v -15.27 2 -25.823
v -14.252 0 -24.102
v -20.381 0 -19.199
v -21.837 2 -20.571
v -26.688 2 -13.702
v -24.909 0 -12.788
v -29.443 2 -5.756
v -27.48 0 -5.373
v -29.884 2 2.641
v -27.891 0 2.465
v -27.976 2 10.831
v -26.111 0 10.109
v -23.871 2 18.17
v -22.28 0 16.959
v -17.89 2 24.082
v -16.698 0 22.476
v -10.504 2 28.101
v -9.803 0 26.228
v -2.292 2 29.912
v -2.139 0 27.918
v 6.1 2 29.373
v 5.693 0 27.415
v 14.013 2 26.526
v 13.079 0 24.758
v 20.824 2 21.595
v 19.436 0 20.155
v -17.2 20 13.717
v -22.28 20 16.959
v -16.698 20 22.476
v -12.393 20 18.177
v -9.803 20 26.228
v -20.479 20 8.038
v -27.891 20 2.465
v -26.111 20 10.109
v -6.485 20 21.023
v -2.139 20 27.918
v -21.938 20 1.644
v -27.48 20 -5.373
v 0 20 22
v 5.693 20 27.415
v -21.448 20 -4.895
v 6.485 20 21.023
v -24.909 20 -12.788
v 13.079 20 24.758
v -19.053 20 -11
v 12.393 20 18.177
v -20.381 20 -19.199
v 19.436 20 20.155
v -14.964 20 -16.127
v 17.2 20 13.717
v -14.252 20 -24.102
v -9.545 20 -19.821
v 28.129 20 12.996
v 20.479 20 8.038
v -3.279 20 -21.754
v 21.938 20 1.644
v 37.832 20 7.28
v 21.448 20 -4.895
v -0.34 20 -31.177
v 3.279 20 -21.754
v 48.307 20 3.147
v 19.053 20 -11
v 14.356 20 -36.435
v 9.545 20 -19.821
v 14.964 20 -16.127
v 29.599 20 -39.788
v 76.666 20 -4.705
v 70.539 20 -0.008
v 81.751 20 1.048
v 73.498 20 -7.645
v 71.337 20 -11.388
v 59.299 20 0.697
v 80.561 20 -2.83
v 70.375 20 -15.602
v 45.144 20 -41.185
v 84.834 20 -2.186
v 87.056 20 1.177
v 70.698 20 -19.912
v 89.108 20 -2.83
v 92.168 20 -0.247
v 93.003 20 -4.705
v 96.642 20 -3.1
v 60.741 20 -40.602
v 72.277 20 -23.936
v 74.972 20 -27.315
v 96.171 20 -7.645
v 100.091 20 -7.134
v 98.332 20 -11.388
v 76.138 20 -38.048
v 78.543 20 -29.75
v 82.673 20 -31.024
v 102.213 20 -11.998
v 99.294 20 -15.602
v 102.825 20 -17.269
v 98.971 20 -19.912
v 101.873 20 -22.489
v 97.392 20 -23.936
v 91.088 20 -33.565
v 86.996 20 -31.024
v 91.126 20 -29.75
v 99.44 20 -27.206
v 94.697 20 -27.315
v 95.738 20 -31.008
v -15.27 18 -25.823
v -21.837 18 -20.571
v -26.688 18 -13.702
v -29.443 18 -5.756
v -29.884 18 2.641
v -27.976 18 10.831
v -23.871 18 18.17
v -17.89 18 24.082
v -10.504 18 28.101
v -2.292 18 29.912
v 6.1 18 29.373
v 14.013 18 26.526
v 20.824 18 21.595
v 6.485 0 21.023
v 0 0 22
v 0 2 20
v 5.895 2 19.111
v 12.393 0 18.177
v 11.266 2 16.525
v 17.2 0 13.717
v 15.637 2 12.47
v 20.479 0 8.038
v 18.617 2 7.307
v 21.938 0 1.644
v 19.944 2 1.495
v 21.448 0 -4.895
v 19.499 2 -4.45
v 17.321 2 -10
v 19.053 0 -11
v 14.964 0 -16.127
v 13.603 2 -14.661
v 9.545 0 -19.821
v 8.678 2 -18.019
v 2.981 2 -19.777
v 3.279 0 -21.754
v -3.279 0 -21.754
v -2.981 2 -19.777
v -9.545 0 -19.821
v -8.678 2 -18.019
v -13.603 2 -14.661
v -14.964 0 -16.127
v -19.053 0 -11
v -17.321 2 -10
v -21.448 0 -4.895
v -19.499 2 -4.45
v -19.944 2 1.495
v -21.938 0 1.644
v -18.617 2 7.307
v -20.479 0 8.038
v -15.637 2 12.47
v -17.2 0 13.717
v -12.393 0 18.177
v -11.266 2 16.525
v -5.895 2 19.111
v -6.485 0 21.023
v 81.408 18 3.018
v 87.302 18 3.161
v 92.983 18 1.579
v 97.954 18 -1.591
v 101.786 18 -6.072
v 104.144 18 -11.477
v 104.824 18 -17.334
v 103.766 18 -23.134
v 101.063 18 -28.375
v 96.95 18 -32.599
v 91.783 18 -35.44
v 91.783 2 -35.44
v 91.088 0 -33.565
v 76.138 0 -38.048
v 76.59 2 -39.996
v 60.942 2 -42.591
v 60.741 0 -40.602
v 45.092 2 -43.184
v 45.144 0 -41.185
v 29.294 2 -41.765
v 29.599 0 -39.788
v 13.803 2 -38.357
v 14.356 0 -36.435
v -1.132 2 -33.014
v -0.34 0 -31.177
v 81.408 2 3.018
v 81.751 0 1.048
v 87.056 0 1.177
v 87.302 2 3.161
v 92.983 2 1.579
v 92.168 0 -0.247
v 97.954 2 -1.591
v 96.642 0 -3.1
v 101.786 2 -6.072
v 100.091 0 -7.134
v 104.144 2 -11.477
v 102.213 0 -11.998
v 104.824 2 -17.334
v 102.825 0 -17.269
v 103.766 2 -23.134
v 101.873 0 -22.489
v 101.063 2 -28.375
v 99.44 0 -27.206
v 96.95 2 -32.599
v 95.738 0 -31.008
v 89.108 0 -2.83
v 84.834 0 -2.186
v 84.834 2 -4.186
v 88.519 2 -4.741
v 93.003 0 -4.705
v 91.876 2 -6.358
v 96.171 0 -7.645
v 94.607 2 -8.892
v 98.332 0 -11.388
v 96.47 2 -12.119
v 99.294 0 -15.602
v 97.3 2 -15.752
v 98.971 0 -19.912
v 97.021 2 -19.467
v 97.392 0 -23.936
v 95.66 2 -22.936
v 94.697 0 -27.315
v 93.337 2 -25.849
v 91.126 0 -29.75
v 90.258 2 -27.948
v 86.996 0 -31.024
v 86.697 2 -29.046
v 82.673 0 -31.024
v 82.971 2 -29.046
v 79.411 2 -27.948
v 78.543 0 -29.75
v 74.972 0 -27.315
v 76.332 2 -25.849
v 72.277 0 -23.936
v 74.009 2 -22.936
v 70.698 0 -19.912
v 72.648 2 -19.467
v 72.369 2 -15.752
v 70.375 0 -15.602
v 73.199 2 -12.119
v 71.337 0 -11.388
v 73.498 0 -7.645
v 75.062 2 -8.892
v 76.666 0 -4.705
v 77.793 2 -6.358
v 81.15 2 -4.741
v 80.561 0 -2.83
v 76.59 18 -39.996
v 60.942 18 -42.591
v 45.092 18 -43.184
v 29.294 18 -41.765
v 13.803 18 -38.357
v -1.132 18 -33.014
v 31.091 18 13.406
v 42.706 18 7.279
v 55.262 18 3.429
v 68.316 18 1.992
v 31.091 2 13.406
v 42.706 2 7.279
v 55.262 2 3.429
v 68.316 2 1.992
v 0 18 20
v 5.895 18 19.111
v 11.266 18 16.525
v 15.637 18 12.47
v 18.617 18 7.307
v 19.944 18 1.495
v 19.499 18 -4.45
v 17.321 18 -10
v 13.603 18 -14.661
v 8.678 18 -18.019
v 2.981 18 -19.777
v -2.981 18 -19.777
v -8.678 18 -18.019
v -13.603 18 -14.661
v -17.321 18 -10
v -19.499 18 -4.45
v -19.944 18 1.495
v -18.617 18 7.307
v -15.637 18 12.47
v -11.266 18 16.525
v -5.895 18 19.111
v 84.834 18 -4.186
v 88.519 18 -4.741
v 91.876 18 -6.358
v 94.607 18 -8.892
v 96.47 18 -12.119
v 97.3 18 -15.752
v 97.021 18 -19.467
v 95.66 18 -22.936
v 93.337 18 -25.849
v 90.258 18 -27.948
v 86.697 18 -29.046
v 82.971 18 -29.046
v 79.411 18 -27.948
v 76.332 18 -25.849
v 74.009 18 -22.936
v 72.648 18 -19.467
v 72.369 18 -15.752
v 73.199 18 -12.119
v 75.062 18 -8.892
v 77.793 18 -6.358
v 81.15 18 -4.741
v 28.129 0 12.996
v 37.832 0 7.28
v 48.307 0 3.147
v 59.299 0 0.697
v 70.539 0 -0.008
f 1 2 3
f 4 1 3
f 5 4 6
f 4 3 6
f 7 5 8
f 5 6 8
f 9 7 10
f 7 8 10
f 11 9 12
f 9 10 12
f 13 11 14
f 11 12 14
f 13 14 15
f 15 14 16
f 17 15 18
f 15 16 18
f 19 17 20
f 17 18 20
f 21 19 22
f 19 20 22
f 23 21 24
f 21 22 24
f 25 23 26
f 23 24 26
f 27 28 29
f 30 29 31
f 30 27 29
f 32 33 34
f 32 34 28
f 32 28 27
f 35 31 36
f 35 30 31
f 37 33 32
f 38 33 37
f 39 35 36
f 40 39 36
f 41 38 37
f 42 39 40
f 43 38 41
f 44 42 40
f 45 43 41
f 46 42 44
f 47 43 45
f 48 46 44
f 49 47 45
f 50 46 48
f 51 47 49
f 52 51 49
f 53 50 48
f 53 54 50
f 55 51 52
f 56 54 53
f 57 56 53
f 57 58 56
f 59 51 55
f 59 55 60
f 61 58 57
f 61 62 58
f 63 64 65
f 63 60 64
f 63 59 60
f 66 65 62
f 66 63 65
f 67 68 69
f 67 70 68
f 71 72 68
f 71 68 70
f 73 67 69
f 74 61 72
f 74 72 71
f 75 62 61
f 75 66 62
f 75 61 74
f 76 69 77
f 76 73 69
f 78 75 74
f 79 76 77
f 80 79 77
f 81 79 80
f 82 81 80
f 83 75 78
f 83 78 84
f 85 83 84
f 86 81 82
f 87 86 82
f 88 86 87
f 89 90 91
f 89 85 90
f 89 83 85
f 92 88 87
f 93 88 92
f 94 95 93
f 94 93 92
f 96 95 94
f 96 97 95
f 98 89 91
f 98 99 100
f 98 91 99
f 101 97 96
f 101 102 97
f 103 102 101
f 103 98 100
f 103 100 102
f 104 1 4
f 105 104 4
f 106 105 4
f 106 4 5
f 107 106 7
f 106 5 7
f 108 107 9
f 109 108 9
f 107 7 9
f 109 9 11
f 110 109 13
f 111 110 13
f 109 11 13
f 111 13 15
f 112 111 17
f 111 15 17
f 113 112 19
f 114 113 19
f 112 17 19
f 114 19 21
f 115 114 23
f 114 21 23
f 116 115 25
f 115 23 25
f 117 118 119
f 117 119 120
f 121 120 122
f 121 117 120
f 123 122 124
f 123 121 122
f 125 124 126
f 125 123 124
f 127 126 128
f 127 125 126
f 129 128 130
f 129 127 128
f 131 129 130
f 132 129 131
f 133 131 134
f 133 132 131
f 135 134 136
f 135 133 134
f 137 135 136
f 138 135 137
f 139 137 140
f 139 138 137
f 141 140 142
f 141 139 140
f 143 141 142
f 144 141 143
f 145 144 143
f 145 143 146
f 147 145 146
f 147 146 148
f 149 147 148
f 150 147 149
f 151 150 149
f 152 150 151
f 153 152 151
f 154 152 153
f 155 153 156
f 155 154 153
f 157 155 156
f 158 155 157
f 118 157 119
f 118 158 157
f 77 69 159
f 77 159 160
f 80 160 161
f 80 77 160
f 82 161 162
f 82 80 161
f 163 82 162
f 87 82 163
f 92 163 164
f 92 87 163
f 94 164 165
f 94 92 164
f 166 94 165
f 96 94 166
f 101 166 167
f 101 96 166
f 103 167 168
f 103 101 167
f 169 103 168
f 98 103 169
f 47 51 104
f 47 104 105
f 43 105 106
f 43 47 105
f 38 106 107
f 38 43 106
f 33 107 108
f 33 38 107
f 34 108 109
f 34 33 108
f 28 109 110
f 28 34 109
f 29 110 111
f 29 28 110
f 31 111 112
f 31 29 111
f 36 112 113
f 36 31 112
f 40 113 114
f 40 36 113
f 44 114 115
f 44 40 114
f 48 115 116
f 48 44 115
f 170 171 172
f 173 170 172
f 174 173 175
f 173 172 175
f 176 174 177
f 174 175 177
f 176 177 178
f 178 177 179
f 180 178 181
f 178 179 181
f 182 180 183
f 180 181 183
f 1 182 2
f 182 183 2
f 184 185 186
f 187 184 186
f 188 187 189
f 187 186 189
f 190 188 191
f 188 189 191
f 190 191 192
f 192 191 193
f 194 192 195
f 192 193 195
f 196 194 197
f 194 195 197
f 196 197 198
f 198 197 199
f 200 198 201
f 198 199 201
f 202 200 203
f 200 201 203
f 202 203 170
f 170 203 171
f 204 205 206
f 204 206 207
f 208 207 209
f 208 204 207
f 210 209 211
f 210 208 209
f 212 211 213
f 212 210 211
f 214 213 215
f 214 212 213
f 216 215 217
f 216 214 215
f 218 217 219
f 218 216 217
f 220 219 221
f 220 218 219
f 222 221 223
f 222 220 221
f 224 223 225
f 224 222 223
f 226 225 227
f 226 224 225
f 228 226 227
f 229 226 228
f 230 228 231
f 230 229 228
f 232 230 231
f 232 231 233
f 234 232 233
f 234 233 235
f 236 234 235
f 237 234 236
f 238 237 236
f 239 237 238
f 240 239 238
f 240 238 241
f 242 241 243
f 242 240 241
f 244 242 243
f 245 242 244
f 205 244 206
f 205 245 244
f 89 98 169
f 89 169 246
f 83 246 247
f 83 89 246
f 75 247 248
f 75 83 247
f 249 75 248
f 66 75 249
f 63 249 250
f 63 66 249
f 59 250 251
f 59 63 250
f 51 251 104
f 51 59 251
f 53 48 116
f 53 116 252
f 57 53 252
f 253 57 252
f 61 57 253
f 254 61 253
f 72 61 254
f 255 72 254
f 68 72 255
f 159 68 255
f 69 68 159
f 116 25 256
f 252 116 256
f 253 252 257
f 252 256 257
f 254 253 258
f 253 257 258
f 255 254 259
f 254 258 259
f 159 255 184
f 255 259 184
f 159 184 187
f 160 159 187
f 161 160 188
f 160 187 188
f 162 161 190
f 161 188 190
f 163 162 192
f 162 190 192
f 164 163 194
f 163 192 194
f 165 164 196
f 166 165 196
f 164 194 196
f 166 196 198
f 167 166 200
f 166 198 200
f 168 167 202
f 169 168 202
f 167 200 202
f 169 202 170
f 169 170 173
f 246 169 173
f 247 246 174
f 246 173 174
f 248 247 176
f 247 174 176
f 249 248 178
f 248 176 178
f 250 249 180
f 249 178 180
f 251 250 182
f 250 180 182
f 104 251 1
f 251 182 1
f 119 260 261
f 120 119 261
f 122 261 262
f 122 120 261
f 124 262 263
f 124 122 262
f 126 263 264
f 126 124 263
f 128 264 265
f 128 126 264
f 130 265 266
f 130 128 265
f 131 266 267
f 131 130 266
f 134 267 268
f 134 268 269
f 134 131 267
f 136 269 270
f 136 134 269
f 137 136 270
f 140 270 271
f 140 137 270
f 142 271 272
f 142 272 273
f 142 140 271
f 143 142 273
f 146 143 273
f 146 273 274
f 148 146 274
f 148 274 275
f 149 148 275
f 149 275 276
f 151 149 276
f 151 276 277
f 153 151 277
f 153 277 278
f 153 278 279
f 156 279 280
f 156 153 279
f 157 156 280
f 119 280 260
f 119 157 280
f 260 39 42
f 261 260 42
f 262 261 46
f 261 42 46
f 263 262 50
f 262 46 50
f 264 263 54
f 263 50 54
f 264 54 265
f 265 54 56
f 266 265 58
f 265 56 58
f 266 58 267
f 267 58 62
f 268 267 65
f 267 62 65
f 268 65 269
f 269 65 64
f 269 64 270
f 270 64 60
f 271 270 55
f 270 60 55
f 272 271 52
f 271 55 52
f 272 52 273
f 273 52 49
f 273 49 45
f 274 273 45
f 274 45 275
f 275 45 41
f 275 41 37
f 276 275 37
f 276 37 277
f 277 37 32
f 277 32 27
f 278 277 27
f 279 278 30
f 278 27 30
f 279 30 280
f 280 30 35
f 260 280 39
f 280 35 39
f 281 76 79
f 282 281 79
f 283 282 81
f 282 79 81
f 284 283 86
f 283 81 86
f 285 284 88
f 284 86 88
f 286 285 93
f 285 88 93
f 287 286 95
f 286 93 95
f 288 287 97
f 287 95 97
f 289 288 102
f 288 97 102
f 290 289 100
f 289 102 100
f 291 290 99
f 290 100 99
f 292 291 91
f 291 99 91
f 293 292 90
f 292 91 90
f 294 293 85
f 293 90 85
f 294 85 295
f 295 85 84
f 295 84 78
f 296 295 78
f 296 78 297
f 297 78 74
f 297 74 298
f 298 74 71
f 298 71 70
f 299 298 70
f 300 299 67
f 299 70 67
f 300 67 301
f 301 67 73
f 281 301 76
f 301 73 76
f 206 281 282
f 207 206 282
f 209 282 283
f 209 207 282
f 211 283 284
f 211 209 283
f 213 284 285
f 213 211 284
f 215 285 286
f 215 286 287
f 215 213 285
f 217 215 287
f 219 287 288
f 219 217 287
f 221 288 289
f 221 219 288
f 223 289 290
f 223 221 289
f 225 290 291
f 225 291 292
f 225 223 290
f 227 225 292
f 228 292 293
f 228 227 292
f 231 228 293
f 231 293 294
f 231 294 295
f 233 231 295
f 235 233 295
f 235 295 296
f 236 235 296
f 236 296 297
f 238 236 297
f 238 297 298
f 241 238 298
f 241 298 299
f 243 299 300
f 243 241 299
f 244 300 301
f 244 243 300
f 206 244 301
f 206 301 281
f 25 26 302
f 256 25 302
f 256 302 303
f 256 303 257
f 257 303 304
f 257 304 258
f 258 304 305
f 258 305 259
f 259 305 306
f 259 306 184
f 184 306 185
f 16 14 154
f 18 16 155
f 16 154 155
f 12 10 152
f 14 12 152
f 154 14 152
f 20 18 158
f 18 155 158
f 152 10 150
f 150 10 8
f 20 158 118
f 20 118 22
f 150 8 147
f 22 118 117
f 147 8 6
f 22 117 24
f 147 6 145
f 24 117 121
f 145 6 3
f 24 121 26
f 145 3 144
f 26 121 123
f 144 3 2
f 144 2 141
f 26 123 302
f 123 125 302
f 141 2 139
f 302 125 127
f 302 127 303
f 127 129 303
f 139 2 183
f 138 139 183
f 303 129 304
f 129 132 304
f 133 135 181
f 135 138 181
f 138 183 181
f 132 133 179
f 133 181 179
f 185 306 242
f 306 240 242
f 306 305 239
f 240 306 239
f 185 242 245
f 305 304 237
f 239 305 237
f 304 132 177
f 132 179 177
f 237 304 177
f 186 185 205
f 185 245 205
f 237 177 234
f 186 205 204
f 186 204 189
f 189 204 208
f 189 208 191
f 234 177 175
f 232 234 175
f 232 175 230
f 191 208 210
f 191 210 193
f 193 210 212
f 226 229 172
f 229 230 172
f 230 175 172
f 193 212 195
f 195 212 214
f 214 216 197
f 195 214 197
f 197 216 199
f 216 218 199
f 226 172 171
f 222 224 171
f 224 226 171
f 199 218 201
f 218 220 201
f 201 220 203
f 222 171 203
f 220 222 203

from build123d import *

# Parameters (mm, degrees)
CROQUIS2_R              = 20
CROQUIS2_R_2            = 12.5
SALIENTE_EXTRUIR1_DEPTH = 20
CHAFL_N1_SIZE           = 2


with BuildPart() as part:
    # Croquis2 → Saliente-Extruir1 (new body)
    with BuildSketch(Plane(origin=(0, 0, 0), x_dir=(1, 0, 0), z_dir=(0, 1, 0))):
        with BuildLine():
            ThreePointArc((-15.269779386, 25.823126021), (-23.871178313, -18.170493828), (20.824407657, -21.59500048))
            ThreePointArc((20.824407657, -21.59500048), (48.893723191, -5.058826483), (81.407845118, -3.018385264))
            ThreePointArc((81.407845118, -3.018385264), (104.144121582, 11.476569523), (91.783061927, 35.440003874))
            ThreePointArc((91.783061927, 35.440003874), (37.170213372, 42.72542693), (-15.269779386, 25.823126021))
        make_face()
        with Locations(Location((0, 0, 0), (0, 0, 270))):
            Circle(CROQUIS2_R, mode=Mode.SUBTRACT)
        with Locations(Location((84.83446024, 16.68588607, 0), (0, 0, 270))):
            Circle(CROQUIS2_R_2, mode=Mode.SUBTRACT)
    extrude(amount=SALIENTE_EXTRUIR1_DEPTH)

    # Chaflán1
    chafl_n1_edges = [part.edges().sort_by_distance(p)[0] for p in [
        (0, 0, -20),
        (0, 20, -20),
        (37.170213372, 20, -42.72542693),
        (84.83446024, 0, -29.18588607),
        (84.83446024, 20, -29.18588607),
        (-23.871178313, 20, 18.170493828),
        (48.893723191, 20, 5.058826483),
        (-23.871178313, 0, 18.170493828),
        (37.170213372, 0, -42.72542693),
        (104.144121582, 0, -11.476569523),
        (48.893723191, 0, 5.058826483),
        (104.144121582, 20, -11.476569523),
    ]]
    chamfer(chafl_n1_edges, length=CHAFL_N1_SIZE)


solid = part.part
